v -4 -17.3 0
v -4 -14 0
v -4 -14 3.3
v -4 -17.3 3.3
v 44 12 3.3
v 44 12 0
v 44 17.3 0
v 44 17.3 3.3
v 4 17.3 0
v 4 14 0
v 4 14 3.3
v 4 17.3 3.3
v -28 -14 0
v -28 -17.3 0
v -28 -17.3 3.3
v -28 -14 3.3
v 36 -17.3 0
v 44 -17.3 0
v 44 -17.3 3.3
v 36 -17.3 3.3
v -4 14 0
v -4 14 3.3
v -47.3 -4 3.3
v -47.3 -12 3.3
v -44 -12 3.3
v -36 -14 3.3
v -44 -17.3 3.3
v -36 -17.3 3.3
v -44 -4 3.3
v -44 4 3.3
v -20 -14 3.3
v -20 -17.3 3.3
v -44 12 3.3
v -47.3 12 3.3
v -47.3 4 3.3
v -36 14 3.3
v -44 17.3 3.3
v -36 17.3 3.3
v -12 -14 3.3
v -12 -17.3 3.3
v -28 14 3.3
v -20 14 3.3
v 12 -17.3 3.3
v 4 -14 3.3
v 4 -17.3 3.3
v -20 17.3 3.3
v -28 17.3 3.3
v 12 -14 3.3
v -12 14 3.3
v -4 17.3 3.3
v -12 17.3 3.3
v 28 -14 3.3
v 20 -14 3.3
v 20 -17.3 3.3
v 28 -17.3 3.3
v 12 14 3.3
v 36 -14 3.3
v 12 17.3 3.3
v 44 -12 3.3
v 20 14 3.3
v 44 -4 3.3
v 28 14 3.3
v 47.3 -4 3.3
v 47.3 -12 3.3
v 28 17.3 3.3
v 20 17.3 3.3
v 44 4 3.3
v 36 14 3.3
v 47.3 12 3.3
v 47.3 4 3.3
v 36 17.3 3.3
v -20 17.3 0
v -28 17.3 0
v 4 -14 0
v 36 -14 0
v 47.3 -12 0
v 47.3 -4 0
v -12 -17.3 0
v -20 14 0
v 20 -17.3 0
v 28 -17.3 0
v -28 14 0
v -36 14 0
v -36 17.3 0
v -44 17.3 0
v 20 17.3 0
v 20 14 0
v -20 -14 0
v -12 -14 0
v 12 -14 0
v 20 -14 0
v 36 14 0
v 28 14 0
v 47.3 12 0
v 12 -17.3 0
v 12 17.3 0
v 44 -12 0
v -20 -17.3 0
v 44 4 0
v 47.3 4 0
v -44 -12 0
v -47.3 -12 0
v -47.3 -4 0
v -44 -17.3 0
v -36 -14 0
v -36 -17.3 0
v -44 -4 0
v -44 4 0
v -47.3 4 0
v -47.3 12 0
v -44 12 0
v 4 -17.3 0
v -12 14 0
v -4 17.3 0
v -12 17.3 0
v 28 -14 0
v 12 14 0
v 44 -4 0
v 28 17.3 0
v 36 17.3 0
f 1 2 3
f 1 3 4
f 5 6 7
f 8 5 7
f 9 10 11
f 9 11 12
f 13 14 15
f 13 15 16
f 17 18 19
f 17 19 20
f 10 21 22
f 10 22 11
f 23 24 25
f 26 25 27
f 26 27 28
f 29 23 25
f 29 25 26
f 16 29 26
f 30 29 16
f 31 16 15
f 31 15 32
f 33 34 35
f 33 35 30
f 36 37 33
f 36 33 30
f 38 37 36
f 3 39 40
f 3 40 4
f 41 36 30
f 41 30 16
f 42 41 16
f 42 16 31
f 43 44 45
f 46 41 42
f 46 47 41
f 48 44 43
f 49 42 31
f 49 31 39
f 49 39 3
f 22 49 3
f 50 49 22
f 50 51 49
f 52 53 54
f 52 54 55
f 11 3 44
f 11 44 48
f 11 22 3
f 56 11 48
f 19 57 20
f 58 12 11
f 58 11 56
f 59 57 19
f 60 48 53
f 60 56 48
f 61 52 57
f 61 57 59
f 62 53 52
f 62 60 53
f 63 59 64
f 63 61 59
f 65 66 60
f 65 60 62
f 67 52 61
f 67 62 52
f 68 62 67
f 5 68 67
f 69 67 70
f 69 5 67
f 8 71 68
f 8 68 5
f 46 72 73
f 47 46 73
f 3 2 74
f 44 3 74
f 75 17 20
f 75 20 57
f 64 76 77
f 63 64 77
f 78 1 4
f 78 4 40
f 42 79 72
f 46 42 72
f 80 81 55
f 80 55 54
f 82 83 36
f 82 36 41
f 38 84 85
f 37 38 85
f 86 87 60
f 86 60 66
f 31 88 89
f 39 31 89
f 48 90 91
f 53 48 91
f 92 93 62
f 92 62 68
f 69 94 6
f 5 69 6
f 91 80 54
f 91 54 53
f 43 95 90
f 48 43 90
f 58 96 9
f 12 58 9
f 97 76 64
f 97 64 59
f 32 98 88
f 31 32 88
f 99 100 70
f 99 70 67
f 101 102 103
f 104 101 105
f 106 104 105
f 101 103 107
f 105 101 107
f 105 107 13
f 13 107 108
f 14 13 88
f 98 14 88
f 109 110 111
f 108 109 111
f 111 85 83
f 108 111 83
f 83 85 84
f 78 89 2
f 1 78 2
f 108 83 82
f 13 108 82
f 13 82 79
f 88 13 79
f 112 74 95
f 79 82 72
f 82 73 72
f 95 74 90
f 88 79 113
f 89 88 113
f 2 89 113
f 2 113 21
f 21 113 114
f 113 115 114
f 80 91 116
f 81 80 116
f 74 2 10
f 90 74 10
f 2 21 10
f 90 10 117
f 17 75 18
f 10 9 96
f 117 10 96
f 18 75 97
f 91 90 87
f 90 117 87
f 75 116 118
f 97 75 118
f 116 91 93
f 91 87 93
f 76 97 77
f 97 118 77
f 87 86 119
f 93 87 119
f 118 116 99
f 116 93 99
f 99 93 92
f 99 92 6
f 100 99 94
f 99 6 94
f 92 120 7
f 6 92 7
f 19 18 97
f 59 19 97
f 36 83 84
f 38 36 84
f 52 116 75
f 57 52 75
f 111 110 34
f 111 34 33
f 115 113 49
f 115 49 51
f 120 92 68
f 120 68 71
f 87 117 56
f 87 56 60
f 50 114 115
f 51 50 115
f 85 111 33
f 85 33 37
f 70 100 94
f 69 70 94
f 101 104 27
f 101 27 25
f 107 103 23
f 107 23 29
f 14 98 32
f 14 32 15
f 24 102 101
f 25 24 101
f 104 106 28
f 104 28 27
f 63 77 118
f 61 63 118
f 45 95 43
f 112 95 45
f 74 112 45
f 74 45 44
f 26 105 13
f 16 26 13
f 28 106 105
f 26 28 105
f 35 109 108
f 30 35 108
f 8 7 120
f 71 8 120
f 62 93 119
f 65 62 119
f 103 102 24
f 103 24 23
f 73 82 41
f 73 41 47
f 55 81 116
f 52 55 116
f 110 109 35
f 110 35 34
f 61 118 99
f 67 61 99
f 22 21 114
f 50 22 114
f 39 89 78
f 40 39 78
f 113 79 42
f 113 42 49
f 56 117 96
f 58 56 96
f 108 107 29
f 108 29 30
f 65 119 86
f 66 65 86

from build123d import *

# Parameters (mm, degrees)
ESQUISSE1_W                    = 94.6
ESQUISSE1_H                    = 28
BOSS_EXTRU_1_DEPTH             = 3.3
ESQUISSE2_W                    = 8
ESQUISSE2_H                    = 3.3
BOSS_EXTRU_2_DEPTH             = 3.3
R_P_TITION_LIN_AIRE1_COUNT     = 3
R_P_TITION_LIN_AIRE1_PITCH     = 16
R_P_TITION_LIN_AIRE1_COL_COUNT = 4
R_P_TITION_LIN_AIRE1_COL_PITCH = 16
SYM_TRIE1_COPY_1_SKETCH_W      = 8
SYM_TRIE1_COPY_1_SKETCH_H      = 3.3
SYM_TRIE1_COPY_1_DEPTH         = 3.3
SYM_TRIE1_COPY_2_SKETCH_W      = 8
SYM_TRIE1_COPY_2_SKETCH_H      = 3.3
SYM_TRIE1_COPY_2_DEPTH         = 3.3
SYM_TRIE1_COPY_3_SKETCH_W      = 8
SYM_TRIE1_COPY_3_SKETCH_H      = 3.3
SYM_TRIE1_COPY_3_DEPTH         = 3.3
SYM_TRIE1_COPY_4_SKETCH_W      = 8
SYM_TRIE1_COPY_4_SKETCH_H      = 3.3
SYM_TRIE1_COPY_4_DEPTH         = 3.3
SYM_TRIE1_COPY_5_SKETCH_W      = 8
SYM_TRIE1_COPY_5_SKETCH_H      = 3.3
SYM_TRIE1_COPY_5_DEPTH         = 3.3
ESQUISSE3_W                    = 3.3
ESQUISSE3_H                    = 8
ESQUISSE3_H_2                  = 2
ENL_V_MAT_EXTRU_1_DEPTH        = 3.3


with BuildPart() as part:
    # Esquisse1 → Boss.-Extru.1 (new body)
    with BuildSketch(Plane.XY):
        Rectangle(ESQUISSE1_W, ESQUISSE1_H)
    extrude(amount=BOSS_EXTRU_1_DEPTH)

    # Esquisse2 → Boss.-Extru.2 (add)
    with BuildSketch(Plane(origin=(0, 0, 0), x_dir=(-1, 0, 0), z_dir=(0, 0, -1))):
        with Locations((8, 15.65)):
            Rectangle(ESQUISSE2_W, ESQUISSE2_H)
    boss_extru_2 = extrude(amount=-BOSS_EXTRU_2_DEPTH)

    # Répétition linéaire1: Boss.-Extru.2 ×3
    with Locations(*[(-i * R_P_TITION_LIN_AIRE1_PITCH, 0, 0) for i in range(1, R_P_TITION_LIN_AIRE1_COUNT)]):
        add(boss_extru_2)

    # Répétition linéaire1 col: Boss.-Extru.2 ×4
    with Locations(*[(i * R_P_TITION_LIN_AIRE1_COL_PITCH, 0, 0) for i in range(1, R_P_TITION_LIN_AIRE1_COL_COUNT)]):
        add(boss_extru_2)

    # Symétrie1: Boss.-Extru.2 across plane
    add(boss_extru_2.mirror(Plane.ZX))

    # Symétrie1 copy 1 sketch → Symétrie1 copy 1 (add)
    with BuildSketch(Plane(origin=(-16, 0, 0), x_dir=(-1, 0, 0), z_dir=(0, 0, -1))):
        with Locations((8, -15.65)):
            Rectangle(SYM_TRIE1_COPY_1_SKETCH_W, SYM_TRIE1_COPY_1_SKETCH_H)
    extrude(amount=-SYM_TRIE1_COPY_1_DEPTH)

    # Symétrie1 copy 2 sketch → Symétrie1 copy 2 (add)
    with BuildSketch(Plane(origin=(-32, 0, 0), x_dir=(-1, 0, 0), z_dir=(0, 0, -1))):
        with Locations((8, -15.65)):
            Rectangle(SYM_TRIE1_COPY_2_SKETCH_W, SYM_TRIE1_COPY_2_SKETCH_H)
    extrude(amount=-SYM_TRIE1_COPY_2_DEPTH)

    # Symétrie1 copy 3 sketch → Symétrie1 copy 3 (add)
    with BuildSketch(Plane(origin=(16, 0, 0), x_dir=(-1, 0, 0), z_dir=(0, 0, -1))):
        with Locations((8, -15.65)):
            Rectangle(SYM_TRIE1_COPY_3_SKETCH_W, SYM_TRIE1_COPY_3_SKETCH_H)
    extrude(amount=-SYM_TRIE1_COPY_3_DEPTH)

    # Symétrie1 copy 4 sketch → Symétrie1 copy 4 (add)
    with BuildSketch(Plane(origin=(32, 0, 0), x_dir=(-1, 0, 0), z_dir=(0, 0, -1))):
        with Locations((8, -15.65)):
            Rectangle(SYM_TRIE1_COPY_4_SKETCH_W, SYM_TRIE1_COPY_4_SKETCH_H)
    extrude(amount=-SYM_TRIE1_COPY_4_DEPTH)

    # Symétrie1 copy 5 sketch → Symétrie1 copy 5 (add)
    with BuildSketch(Plane(origin=(48, 0, 0), x_dir=(-1, 0, 0), z_dir=(0, 0, -1))):
        with Locations((8, -15.65)):
            Rectangle(SYM_TRIE1_COPY_5_SKETCH_W, SYM_TRIE1_COPY_5_SKETCH_H)
    extrude(amount=-SYM_TRIE1_COPY_5_DEPTH)

    # Esquisse3 → Enlèv. mat.-Extru.1 (cut)
    with BuildSketch(Plane(origin=(0, 0, 0), x_dir=(-1, 0, 0), z_dir=(0, 0, -1))):
        with Locations((-45.65, 0)):
            Rectangle(ESQUISSE3_W, ESQUISSE3_H)
        with Locations((-45.65, 13)):
            Rectangle(ESQUISSE3_W, ESQUISSE3_H_2)
        with Locations((-45.65, -13)):
            Rectangle(ESQUISSE3_W, ESQUISSE3_H_2)
    enl_v_mat_extru_1 = extrude(amount=-ENL_V_MAT_EXTRU_1_DEPTH, mode=Mode.SUBTRACT)

    # Symétrie2: Enlèv. mat.-Extru.1 across plane
    add(enl_v_mat_extru_1.mirror(Plane(origin=(0, 0, 0), x_dir=(0, 0, 1), z_dir=(1, 0, 0))), mode=Mode.SUBTRACT)


solid = part.part
